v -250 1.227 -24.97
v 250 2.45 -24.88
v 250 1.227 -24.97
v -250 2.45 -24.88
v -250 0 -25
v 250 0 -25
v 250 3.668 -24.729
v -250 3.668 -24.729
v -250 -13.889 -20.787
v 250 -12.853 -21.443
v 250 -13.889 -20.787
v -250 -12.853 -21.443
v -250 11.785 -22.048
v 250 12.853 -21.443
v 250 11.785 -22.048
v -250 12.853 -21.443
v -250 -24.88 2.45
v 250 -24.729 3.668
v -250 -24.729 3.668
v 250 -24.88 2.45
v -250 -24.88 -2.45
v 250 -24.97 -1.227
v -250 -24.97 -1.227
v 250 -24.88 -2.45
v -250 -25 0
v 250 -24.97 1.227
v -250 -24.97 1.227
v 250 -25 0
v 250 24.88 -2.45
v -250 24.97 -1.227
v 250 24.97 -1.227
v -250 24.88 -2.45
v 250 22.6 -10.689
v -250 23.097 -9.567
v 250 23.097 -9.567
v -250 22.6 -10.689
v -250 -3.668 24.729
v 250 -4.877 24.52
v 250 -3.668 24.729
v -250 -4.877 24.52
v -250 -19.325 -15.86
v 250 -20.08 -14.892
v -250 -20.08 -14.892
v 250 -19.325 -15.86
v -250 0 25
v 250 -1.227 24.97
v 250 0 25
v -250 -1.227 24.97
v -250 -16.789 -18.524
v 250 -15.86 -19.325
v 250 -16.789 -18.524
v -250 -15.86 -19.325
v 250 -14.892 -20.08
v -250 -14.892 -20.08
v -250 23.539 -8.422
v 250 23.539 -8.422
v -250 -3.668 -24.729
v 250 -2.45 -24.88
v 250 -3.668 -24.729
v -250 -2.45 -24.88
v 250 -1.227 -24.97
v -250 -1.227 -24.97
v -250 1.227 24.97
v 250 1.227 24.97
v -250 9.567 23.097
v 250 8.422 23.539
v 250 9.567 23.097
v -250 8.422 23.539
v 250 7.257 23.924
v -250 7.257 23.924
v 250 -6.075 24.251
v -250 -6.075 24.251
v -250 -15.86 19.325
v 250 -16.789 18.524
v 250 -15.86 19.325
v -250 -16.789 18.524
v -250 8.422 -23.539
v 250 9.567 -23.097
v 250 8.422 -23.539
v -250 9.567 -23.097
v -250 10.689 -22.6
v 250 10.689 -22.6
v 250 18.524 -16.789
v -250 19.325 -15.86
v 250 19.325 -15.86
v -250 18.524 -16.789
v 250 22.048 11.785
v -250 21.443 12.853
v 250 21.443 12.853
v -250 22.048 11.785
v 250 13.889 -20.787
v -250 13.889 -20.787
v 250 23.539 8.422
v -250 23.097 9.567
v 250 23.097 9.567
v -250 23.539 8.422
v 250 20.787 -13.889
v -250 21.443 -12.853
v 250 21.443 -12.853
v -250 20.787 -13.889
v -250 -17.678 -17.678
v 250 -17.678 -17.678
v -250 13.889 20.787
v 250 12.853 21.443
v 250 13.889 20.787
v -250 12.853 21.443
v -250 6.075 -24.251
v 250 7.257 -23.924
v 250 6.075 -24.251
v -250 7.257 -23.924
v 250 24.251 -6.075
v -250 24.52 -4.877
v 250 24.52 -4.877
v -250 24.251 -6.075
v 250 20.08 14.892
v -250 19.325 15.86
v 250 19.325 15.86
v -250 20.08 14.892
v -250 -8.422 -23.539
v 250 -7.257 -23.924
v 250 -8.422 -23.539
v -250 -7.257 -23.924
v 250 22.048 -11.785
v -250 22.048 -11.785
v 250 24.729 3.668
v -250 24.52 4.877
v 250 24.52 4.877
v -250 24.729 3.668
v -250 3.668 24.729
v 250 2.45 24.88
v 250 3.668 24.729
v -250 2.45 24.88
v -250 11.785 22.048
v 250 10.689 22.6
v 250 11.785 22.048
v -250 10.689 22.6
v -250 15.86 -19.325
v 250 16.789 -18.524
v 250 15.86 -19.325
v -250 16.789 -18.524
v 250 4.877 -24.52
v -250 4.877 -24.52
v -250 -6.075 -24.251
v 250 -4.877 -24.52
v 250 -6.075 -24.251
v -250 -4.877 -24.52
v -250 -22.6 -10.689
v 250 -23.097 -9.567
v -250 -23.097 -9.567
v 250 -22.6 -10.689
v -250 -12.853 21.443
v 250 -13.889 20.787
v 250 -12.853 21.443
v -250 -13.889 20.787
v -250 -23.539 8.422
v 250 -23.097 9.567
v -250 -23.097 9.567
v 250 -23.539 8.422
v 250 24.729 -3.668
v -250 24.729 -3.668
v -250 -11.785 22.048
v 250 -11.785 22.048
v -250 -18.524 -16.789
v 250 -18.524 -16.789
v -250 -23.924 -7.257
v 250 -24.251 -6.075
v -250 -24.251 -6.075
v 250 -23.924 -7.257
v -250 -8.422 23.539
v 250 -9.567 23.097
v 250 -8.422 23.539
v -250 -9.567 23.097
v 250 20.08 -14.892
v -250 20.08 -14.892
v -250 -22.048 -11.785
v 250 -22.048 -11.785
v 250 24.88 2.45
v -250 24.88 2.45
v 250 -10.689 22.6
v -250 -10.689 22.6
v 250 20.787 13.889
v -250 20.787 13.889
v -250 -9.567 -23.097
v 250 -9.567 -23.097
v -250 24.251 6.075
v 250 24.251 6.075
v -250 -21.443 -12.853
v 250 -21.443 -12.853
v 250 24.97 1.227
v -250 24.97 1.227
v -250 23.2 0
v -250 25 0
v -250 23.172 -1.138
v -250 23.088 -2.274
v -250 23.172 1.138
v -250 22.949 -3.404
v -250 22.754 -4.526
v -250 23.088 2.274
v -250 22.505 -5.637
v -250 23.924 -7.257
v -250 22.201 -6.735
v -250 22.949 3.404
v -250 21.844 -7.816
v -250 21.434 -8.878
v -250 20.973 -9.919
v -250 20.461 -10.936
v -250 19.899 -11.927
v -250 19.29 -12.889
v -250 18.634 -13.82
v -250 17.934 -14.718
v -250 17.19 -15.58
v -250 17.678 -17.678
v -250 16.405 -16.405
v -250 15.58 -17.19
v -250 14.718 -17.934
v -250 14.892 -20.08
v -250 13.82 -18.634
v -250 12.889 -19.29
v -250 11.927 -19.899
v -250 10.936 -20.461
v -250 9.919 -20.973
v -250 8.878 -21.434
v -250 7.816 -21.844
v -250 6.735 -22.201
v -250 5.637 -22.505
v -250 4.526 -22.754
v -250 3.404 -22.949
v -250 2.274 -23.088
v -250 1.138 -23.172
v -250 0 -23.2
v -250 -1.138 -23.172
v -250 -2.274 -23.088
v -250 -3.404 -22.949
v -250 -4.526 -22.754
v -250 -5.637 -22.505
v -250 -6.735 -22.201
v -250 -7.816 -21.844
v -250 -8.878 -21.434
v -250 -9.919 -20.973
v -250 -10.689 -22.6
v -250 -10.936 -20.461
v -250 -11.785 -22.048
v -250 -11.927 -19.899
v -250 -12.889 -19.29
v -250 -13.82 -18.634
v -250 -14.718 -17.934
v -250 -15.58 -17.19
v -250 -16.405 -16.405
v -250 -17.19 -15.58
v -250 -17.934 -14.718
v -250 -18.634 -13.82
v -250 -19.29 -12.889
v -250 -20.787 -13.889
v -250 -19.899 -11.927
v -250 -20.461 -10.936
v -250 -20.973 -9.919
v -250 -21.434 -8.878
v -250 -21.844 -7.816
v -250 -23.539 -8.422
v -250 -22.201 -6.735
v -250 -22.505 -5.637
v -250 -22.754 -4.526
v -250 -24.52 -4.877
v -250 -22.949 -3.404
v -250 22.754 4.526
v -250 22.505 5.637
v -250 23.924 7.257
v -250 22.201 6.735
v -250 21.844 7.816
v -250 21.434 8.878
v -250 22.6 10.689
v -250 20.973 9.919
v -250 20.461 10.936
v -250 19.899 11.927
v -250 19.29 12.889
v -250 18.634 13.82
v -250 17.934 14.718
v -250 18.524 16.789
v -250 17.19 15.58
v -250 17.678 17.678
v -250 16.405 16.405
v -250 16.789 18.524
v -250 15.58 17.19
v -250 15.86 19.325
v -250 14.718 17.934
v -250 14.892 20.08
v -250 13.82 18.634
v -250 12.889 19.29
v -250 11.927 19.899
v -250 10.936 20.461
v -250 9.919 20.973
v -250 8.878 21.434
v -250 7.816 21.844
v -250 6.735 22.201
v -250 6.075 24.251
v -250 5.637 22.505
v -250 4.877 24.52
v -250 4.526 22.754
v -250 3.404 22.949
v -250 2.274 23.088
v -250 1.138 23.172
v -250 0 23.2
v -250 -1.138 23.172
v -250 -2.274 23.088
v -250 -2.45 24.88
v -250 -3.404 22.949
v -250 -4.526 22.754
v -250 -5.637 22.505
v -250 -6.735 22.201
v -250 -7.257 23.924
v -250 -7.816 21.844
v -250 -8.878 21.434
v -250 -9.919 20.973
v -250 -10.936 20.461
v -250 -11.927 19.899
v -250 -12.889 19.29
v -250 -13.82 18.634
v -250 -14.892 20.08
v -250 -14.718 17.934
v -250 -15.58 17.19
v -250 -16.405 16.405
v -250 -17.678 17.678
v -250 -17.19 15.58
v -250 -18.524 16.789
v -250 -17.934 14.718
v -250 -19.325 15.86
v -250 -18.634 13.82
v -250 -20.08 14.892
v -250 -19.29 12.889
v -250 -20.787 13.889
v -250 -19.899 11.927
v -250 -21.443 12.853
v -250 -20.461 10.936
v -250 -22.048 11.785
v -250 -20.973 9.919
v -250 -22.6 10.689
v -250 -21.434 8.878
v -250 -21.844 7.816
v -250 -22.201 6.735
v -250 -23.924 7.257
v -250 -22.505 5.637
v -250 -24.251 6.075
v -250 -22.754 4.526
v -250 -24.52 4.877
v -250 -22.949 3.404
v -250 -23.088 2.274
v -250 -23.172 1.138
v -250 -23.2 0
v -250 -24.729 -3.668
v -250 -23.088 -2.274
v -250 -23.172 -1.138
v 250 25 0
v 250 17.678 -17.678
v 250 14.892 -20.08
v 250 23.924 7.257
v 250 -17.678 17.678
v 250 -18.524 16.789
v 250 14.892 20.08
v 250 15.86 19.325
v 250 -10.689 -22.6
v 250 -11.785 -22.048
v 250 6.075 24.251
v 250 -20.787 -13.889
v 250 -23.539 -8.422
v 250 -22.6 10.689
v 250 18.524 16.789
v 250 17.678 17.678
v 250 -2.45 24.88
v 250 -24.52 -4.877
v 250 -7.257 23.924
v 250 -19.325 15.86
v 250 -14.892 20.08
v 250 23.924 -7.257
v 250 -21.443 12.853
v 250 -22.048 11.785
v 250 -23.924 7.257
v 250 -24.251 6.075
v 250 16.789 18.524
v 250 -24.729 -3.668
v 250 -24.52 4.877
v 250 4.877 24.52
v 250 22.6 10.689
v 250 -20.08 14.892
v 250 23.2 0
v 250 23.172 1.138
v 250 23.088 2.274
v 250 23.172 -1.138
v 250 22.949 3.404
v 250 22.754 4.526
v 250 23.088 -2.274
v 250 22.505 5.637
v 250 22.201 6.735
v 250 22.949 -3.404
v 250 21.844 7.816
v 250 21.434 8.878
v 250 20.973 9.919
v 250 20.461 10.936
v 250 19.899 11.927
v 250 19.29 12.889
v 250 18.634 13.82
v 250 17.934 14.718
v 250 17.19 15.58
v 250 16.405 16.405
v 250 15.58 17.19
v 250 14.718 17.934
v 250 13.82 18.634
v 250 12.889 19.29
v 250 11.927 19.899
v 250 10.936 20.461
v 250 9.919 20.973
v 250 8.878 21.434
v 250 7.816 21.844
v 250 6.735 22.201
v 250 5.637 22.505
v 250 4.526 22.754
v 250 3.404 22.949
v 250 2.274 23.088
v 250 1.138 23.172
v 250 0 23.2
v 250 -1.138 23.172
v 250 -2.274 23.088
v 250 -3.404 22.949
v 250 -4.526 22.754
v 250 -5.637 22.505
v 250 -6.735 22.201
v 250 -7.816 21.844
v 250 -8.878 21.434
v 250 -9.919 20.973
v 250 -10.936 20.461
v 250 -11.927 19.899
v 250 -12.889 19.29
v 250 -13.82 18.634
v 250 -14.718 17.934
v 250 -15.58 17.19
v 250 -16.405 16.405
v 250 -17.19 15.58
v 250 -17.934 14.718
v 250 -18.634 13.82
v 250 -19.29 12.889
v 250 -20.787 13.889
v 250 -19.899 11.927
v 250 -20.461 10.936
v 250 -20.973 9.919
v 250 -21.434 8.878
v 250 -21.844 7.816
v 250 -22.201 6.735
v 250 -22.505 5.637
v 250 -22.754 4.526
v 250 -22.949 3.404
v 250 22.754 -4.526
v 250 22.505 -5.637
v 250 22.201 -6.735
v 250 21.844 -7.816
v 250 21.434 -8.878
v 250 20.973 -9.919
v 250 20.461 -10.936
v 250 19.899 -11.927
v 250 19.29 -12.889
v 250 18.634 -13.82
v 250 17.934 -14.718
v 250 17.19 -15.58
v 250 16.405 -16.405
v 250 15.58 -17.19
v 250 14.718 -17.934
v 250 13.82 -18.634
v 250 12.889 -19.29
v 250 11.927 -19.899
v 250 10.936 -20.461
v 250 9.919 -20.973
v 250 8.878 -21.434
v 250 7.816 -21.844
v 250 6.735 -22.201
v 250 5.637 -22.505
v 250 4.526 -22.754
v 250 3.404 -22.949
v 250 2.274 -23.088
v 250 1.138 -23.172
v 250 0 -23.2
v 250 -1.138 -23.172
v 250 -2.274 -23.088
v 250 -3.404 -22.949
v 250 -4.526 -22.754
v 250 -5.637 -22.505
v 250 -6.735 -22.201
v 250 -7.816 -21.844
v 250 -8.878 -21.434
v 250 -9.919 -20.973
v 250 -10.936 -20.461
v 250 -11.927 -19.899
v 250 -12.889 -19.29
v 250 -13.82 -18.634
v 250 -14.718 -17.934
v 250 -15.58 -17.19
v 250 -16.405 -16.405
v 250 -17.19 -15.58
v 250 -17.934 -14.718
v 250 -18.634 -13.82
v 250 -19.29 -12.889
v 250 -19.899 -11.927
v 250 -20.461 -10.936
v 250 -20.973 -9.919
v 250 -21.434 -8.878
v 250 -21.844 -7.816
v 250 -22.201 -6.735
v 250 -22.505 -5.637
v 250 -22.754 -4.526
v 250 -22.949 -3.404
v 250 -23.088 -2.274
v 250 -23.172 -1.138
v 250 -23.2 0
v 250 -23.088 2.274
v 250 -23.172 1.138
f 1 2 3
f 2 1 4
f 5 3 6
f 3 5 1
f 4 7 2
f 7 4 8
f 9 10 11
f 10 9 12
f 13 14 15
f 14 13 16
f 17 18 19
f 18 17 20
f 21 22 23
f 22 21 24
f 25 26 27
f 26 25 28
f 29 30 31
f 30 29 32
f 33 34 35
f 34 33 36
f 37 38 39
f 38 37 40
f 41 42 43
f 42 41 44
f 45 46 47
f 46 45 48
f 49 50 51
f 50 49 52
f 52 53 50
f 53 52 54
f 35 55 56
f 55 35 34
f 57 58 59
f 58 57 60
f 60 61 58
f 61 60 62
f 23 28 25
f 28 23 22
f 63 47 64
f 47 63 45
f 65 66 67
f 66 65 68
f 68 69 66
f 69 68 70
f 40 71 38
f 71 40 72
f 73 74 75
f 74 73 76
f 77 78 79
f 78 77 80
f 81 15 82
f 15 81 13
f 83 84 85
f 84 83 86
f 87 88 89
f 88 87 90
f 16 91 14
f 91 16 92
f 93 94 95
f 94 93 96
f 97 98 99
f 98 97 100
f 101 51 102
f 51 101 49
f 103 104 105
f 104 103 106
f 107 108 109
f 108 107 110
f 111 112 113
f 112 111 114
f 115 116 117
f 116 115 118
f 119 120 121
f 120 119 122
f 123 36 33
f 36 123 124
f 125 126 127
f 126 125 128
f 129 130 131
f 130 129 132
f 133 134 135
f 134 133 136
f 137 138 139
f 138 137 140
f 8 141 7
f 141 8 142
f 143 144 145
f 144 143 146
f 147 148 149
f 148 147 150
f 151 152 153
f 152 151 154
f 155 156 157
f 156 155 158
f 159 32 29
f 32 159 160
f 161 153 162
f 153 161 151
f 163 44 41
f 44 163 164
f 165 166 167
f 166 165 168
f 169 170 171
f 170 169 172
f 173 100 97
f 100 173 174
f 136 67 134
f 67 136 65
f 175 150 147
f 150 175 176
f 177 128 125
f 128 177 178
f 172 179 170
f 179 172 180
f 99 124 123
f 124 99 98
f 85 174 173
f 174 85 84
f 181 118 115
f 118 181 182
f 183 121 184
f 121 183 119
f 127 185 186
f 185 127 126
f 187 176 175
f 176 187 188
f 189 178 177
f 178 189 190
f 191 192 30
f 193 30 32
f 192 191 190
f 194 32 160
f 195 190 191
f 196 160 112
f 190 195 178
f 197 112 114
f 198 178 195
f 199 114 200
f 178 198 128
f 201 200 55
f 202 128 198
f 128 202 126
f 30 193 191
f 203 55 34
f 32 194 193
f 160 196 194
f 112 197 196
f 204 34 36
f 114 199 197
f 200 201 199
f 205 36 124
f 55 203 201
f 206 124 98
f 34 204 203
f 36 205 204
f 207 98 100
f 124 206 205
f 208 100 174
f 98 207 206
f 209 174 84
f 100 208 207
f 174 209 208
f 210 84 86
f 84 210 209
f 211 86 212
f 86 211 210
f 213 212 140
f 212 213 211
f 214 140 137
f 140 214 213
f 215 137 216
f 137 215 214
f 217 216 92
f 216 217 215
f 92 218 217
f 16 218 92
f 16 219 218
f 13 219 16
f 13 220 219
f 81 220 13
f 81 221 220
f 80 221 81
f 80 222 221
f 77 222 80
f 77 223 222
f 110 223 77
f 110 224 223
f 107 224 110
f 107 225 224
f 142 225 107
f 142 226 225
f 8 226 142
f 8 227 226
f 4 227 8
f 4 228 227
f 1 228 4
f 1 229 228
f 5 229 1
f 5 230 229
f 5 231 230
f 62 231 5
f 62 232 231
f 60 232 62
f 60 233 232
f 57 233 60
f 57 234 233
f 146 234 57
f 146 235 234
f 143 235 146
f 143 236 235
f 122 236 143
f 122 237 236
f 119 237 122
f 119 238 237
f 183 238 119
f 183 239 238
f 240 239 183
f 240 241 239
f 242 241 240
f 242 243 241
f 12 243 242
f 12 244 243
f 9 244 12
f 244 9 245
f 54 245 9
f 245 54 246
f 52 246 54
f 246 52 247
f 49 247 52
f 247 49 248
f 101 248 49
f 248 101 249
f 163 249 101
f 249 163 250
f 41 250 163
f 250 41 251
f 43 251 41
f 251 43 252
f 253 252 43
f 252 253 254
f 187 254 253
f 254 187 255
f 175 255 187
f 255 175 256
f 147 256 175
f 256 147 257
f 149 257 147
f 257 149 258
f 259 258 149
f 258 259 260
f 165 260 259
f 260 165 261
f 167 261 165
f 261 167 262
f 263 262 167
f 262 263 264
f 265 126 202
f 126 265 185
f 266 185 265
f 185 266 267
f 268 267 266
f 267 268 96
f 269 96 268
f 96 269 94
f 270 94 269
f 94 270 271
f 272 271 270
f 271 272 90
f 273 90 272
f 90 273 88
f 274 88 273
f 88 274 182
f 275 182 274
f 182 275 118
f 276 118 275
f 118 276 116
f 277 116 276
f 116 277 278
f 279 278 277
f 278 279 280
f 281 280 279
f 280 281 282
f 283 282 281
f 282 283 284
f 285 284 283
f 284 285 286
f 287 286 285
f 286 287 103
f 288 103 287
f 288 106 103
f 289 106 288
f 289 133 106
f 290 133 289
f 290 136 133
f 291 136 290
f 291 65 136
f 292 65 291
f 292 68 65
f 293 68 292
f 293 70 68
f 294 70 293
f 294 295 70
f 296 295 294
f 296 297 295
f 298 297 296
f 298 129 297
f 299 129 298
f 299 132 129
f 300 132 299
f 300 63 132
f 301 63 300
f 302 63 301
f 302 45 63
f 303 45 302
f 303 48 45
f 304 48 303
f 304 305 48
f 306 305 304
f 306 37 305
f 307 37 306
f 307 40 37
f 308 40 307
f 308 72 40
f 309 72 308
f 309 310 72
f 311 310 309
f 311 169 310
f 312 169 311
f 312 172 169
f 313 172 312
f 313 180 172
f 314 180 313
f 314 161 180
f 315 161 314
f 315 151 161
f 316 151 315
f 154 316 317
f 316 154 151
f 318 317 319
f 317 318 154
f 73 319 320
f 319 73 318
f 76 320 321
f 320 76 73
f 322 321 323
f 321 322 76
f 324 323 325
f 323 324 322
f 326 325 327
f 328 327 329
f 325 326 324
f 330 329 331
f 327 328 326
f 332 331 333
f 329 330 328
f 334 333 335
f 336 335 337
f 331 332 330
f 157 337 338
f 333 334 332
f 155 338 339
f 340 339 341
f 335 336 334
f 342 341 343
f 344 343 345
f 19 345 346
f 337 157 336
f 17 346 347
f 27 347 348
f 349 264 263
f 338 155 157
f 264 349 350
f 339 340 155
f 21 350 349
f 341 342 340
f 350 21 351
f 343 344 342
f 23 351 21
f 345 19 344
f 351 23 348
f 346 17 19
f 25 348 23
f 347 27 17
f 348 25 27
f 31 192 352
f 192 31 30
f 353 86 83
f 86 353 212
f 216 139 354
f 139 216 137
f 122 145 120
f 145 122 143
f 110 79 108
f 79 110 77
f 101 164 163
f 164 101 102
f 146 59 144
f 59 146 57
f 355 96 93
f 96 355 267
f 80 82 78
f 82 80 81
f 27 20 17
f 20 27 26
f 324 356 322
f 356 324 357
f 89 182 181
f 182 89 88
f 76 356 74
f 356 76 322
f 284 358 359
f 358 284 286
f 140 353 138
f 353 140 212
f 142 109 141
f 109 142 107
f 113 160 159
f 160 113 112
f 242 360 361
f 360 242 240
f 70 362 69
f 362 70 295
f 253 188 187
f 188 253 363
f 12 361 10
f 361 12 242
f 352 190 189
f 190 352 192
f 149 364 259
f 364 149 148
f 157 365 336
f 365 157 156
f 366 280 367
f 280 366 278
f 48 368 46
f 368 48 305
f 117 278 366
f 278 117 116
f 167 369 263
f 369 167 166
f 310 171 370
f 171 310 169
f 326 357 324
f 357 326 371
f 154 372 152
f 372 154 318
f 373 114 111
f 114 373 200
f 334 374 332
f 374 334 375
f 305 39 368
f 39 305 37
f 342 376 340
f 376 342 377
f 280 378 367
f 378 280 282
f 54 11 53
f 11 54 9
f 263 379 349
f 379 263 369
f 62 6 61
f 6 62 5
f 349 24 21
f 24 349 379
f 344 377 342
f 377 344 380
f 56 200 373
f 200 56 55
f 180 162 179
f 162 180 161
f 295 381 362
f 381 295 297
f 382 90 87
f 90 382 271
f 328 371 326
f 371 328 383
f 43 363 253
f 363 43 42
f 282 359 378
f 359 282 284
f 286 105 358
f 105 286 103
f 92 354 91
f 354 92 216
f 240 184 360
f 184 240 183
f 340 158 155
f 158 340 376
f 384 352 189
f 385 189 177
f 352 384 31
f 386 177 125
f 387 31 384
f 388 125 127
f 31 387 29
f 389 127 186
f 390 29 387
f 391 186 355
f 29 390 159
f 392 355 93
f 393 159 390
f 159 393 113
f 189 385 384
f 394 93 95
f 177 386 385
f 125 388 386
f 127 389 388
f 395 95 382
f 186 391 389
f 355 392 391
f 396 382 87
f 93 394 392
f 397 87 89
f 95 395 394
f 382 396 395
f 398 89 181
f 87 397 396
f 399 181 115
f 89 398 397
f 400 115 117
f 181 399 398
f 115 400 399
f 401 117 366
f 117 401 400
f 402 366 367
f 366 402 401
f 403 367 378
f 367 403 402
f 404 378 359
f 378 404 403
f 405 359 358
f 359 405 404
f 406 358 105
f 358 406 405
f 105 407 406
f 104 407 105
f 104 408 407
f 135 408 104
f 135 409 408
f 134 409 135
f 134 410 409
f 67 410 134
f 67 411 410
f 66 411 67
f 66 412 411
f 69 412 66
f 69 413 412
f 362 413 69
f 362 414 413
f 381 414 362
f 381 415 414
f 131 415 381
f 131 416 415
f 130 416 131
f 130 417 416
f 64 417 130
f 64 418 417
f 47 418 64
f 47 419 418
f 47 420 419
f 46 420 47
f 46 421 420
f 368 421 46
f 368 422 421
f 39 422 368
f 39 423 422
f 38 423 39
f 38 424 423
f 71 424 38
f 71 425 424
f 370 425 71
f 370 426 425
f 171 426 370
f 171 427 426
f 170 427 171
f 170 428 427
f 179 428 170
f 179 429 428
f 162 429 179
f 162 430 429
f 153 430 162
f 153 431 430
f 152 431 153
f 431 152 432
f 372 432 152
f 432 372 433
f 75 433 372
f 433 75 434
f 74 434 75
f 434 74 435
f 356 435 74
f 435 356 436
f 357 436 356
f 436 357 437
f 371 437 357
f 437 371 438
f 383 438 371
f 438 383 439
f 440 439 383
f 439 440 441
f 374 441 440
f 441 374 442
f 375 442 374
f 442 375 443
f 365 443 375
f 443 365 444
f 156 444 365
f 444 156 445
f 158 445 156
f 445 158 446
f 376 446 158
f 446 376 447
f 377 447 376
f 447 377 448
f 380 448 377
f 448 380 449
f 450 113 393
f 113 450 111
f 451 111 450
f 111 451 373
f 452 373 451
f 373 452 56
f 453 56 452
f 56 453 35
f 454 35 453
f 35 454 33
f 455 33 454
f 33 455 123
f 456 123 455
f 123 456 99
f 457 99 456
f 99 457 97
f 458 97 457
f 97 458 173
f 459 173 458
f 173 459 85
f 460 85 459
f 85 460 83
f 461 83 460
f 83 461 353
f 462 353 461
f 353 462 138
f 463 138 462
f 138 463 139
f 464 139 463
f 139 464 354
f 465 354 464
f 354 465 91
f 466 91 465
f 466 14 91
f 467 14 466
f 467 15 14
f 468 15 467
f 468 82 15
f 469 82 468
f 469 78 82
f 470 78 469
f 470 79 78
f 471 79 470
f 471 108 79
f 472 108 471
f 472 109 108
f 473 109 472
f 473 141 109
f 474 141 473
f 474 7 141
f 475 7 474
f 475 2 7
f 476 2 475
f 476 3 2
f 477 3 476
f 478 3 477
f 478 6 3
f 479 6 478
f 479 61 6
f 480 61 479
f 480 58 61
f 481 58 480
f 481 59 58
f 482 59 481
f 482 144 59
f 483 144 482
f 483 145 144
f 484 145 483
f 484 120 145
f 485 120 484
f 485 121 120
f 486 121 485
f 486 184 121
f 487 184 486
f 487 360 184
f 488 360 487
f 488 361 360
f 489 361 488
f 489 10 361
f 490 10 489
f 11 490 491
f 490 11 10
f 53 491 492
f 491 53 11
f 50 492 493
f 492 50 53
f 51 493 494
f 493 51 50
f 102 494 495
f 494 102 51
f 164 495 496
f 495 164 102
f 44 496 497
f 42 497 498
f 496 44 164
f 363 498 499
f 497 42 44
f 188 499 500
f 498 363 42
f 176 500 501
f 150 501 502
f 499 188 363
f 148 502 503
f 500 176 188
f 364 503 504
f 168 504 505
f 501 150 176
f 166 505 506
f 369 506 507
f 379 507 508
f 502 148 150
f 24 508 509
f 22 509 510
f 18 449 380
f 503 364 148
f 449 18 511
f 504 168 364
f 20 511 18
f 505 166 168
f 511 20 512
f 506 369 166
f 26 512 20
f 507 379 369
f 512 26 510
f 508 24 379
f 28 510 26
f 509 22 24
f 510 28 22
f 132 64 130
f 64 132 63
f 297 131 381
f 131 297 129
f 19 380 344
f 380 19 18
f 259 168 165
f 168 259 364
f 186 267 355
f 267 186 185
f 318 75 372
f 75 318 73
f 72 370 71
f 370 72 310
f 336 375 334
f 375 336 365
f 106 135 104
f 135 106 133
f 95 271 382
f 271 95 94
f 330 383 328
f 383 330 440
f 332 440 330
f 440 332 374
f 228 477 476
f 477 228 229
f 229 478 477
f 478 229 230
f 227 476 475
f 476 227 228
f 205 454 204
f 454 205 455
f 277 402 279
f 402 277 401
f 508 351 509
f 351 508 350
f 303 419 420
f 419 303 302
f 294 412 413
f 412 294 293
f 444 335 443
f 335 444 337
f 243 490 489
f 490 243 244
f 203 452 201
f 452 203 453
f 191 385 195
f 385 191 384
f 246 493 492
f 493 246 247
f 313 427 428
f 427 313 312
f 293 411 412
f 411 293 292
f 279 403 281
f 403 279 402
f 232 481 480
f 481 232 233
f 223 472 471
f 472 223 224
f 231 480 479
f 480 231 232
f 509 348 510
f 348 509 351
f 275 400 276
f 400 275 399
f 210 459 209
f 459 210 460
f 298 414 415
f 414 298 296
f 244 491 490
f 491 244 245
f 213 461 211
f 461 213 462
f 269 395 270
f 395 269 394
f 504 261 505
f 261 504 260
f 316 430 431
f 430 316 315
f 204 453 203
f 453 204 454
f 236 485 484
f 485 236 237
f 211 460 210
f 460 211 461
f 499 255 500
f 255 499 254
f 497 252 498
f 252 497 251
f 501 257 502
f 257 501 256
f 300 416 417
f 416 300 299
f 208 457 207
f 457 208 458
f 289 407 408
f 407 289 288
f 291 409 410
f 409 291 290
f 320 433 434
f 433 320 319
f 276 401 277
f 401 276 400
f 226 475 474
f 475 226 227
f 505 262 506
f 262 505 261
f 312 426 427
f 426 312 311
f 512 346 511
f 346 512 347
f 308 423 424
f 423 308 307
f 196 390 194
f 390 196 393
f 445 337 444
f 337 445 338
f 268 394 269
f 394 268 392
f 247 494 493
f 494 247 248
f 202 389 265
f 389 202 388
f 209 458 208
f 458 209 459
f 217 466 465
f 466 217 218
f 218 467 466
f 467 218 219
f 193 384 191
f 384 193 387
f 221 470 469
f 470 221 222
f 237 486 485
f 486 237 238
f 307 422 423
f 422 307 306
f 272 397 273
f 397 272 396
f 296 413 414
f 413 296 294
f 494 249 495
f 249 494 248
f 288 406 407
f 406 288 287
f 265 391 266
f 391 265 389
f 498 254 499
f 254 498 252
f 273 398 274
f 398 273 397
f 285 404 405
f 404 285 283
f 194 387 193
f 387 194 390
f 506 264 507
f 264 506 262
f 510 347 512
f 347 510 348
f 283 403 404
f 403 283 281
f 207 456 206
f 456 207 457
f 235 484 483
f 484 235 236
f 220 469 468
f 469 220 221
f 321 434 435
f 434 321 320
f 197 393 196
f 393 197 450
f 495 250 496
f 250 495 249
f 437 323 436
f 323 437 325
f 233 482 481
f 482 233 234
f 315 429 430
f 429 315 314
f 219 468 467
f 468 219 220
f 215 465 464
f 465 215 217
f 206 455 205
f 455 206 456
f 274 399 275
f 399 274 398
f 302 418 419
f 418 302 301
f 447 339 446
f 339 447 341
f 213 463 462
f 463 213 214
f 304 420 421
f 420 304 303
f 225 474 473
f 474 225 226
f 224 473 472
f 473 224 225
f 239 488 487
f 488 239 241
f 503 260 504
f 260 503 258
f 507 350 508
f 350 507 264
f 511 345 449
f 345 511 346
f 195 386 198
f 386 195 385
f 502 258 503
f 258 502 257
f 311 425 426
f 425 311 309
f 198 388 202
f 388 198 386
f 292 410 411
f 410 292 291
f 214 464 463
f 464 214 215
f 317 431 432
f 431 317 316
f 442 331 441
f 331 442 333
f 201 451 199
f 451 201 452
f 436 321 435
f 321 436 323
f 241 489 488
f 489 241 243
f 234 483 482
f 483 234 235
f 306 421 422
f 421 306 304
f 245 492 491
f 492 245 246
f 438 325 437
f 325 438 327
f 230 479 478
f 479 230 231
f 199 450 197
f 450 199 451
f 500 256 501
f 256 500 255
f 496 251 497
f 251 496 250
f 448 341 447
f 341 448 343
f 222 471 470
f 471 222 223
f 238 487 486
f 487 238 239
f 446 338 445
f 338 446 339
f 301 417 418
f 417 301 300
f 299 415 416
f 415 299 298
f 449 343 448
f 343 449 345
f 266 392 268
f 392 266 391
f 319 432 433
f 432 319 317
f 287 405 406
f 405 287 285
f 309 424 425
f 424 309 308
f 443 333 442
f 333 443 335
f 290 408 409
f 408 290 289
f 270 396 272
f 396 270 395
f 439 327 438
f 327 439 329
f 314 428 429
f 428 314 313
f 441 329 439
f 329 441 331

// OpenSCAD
$fn = 128;

// HT 50 pipe: OD 50 mm, length 500 mm (approx wall 1.8 mm)
pipe_length = 500;
od = 50;
wall = 1.8;
id = od - 2*wall;

module ht_pipe(len, od, id) {
    // Orient pipe along X so front/back/left/right show length (not end ring)
    rotate([0, 90, 0])
        difference() {
            cylinder(h = len, d = od, center = true);
            cylinder(h = len + 2, d = id, center = true); // +2 ensures clean through-cut
        }
}

ht_pipe(pipe_length, od, id);
